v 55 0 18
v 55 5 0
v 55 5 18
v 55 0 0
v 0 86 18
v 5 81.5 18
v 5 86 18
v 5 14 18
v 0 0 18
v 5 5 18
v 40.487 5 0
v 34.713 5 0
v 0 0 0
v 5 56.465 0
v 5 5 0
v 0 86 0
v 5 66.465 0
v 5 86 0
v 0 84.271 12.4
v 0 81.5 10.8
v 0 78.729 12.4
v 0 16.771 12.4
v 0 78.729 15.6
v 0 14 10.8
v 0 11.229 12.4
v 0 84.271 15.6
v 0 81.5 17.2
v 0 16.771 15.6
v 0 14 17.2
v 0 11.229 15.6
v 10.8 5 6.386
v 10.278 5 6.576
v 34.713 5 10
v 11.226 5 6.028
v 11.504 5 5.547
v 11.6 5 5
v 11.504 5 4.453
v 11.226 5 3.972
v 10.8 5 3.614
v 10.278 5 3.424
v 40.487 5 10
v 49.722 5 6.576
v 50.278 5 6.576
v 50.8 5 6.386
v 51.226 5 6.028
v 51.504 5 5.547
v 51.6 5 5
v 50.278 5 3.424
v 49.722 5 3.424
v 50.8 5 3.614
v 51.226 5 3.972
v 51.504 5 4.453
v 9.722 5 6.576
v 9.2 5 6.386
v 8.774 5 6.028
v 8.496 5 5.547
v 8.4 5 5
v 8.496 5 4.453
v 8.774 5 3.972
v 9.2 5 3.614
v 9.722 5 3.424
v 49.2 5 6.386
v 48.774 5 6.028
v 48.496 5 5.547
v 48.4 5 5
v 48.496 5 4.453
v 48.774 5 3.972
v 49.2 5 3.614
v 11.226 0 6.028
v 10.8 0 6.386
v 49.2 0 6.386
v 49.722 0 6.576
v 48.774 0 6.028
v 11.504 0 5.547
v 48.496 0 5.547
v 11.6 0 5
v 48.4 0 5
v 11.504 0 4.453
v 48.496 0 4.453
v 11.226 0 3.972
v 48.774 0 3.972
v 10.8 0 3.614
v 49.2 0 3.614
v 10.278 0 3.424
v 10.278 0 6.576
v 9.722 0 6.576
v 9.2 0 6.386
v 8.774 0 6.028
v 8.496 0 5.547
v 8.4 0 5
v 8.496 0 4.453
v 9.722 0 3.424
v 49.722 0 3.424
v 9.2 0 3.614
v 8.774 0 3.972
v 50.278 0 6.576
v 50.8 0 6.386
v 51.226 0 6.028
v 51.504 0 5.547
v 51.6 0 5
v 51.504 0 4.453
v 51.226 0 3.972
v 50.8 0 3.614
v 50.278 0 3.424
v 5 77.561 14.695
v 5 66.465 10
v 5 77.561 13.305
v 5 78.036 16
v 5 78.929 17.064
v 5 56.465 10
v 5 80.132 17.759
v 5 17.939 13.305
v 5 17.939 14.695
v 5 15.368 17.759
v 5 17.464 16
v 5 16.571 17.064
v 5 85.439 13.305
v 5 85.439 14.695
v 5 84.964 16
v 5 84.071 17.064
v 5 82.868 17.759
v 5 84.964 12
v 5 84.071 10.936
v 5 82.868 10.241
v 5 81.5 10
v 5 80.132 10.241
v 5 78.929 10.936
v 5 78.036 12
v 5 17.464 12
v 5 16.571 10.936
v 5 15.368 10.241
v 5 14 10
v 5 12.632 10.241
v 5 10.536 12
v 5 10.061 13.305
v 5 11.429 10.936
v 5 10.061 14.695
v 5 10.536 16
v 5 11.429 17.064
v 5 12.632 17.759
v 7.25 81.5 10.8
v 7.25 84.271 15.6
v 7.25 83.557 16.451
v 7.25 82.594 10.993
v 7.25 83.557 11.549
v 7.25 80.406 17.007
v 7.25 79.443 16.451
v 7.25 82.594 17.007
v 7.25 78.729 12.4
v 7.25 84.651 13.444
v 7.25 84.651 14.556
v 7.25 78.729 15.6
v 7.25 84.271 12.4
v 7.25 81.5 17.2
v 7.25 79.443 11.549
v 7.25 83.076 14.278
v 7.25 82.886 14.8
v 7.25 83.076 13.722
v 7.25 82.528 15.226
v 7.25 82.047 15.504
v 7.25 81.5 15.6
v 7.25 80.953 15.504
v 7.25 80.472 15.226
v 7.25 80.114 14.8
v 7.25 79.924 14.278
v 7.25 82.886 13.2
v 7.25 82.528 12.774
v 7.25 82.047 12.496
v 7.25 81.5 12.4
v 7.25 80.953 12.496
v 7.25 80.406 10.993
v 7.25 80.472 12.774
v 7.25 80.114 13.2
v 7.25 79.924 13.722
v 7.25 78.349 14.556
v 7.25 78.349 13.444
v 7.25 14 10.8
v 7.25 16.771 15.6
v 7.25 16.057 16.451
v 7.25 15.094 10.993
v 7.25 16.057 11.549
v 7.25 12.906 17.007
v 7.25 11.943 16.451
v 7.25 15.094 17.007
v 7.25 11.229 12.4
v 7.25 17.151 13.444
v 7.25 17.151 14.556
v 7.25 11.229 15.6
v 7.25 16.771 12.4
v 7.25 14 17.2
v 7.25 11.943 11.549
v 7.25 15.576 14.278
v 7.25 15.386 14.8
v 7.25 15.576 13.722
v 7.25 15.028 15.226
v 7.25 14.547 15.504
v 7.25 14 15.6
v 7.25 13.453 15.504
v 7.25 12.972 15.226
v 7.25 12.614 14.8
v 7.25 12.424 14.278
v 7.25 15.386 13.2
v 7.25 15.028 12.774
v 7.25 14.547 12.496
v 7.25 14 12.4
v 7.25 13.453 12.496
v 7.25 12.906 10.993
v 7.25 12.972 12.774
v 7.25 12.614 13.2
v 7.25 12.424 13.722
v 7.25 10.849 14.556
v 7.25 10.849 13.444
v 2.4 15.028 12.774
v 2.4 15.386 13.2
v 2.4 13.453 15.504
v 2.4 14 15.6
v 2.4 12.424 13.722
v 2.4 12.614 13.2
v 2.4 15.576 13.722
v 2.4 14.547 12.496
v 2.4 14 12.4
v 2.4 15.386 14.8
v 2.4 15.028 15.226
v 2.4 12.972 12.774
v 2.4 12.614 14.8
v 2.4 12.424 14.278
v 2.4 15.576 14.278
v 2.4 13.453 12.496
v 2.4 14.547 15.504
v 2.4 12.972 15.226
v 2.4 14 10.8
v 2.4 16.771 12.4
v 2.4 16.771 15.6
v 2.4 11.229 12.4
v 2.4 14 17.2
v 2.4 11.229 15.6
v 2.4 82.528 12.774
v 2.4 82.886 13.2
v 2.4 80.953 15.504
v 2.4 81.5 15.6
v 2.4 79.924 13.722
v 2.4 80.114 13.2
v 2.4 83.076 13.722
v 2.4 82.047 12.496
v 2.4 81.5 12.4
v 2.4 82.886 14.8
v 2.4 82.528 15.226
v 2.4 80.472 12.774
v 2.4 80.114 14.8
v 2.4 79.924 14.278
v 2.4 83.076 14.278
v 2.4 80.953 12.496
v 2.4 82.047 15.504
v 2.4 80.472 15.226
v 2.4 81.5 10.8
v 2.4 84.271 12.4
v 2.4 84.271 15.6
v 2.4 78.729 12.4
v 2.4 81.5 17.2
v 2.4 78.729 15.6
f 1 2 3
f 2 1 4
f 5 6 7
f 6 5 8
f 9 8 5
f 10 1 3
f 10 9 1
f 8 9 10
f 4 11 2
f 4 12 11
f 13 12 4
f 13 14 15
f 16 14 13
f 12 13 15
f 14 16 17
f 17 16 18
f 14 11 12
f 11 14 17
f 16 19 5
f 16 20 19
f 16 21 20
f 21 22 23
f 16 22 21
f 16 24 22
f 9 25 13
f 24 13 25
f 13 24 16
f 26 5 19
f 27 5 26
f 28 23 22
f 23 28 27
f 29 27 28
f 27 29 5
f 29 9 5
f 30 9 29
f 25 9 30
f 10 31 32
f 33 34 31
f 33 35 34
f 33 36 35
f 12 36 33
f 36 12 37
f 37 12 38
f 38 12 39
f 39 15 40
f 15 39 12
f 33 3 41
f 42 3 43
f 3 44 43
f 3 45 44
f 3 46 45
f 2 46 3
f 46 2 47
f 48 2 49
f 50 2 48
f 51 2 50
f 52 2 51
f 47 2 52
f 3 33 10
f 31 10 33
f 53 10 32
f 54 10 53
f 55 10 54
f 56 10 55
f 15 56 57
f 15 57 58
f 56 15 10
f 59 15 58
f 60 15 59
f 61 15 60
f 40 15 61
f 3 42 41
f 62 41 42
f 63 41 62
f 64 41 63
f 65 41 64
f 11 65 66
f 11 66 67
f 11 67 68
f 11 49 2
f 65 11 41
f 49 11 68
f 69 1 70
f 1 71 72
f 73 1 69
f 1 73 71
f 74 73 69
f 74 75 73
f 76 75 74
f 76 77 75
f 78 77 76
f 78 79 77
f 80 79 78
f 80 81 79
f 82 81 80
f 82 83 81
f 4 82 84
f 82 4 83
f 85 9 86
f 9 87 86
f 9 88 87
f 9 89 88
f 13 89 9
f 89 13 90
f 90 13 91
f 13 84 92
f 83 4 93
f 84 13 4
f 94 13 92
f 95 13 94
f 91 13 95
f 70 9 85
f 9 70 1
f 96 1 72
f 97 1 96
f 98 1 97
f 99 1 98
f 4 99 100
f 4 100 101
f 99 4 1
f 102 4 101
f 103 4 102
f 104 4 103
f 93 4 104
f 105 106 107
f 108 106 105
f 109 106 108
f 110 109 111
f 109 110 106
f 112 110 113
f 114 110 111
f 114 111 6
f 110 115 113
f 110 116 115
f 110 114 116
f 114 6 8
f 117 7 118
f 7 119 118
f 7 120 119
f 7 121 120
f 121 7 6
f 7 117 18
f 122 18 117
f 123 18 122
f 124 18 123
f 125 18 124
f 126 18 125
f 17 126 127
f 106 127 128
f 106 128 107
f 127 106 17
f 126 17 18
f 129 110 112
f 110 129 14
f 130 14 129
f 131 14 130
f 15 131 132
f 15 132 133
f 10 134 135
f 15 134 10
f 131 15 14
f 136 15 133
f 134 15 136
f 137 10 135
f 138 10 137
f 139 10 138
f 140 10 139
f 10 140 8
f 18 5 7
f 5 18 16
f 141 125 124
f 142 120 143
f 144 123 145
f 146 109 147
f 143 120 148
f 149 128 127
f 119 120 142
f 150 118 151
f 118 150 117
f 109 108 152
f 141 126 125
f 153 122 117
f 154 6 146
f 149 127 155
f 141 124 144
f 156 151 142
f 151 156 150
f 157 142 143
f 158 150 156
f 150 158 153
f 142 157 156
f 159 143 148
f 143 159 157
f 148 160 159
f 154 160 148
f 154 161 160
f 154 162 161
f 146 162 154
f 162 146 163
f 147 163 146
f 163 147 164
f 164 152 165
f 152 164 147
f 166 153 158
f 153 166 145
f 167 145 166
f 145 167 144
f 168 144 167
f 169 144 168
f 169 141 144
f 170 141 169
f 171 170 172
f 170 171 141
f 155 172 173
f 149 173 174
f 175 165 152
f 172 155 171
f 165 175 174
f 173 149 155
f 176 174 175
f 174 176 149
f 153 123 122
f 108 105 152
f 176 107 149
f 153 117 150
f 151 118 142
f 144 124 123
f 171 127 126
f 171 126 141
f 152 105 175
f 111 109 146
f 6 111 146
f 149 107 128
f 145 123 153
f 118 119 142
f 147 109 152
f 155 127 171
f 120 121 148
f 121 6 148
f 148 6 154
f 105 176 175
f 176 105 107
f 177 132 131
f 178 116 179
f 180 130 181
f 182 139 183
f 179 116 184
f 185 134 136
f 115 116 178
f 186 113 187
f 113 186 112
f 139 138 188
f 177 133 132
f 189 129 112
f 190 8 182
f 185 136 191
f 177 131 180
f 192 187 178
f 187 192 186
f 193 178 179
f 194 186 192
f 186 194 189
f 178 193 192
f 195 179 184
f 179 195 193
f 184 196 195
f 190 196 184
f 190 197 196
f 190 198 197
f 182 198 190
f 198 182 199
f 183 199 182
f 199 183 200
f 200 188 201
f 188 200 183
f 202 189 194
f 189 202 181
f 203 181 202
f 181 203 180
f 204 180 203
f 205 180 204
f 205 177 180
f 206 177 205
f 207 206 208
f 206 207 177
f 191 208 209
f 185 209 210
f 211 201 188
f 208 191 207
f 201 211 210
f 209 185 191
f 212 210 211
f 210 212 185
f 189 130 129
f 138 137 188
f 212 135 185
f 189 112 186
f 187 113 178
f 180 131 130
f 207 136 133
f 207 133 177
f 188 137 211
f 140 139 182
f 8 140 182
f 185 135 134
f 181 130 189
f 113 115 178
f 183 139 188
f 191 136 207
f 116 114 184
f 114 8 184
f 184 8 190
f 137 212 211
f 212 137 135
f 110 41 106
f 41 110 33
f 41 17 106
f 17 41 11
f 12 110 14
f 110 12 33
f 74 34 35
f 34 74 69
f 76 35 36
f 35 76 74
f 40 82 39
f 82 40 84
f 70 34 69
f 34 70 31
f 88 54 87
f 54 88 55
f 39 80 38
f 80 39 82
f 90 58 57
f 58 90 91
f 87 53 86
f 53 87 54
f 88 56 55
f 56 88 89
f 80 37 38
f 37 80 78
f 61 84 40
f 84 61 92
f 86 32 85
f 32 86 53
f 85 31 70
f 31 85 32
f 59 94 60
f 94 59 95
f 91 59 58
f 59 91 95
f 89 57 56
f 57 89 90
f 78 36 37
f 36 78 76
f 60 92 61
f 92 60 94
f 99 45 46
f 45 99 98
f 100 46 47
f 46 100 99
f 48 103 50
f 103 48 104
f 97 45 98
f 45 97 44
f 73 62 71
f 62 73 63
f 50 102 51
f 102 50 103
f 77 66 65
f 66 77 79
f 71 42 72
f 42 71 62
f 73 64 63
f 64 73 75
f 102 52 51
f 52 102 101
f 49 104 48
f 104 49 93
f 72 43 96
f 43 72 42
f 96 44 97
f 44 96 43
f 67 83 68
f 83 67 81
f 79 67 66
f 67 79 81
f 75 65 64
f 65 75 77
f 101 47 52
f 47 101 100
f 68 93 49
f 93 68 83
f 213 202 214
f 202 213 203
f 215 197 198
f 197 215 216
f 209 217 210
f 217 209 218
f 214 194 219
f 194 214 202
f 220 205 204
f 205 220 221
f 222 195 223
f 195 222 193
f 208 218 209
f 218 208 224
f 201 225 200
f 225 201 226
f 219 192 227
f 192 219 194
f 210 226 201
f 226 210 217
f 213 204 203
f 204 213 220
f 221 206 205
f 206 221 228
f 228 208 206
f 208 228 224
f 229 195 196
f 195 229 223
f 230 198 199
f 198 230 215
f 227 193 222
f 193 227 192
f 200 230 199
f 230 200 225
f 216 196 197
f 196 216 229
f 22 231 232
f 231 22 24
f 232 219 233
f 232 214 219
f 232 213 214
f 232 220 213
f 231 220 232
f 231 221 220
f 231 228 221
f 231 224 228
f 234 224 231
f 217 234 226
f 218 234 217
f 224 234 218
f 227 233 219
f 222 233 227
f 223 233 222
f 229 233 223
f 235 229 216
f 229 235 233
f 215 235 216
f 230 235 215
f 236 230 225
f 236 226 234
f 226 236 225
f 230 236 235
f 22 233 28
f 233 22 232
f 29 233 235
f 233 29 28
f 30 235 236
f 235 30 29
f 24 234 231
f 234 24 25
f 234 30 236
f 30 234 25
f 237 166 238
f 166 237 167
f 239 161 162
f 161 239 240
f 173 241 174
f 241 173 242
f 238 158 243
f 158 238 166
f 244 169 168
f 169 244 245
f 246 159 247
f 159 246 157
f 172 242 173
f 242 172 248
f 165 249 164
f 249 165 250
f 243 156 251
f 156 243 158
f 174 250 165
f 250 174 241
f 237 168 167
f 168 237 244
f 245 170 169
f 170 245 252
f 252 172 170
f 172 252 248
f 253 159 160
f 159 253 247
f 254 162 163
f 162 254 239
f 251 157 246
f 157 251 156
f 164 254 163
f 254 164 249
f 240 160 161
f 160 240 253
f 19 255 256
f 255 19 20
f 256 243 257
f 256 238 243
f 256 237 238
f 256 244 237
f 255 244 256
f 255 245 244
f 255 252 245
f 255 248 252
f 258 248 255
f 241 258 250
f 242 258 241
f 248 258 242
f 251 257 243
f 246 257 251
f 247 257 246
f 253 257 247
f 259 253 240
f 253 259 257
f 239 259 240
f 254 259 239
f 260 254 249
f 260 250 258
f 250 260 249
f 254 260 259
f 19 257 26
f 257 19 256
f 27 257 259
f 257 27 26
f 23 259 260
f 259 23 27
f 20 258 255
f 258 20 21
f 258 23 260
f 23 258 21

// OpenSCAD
// file: configuration.scad
$fn = 18;

wall = 5;

bolt_slop = .5;
nut_slop = .85;
bolt_dia = 5+bolt_slop;
bolt_rad = bolt_dia/2;
bolt_cap_dia = 9.5+bolt_slop;
bolt_cap_rad = bolt_cap_dia/2;
nut_dia = 9+nut_slop;
nut_rad = nut_dia/2;
nut_height = 3;

ext_x = 20;
ext_y = 60;
// main file
include <configuration.scad>;

rumba_mount(left = true);
//rumba_mount(left = false);
//fan_mount();

rumba_x = 76;
rumba_y = 135;
mount_w = 8;


module rumba_mount(left = true){
	screwhole = 3.2;
	nuthole = 6.4;
	rad = screwhole/2;
	bump_h = 2.25;
	nutrad = nuthole/2;
	far_bolt = 71.5;
	close_bolt = 4;
	mid_bolt = 36;

	//set this to the mounting screw size
	mount_screw = 3.2/2;

	mirror([(left)?0:1,0,0])
	difference(){
		union(){
			//extrusion mount
			cube([ext_y-5, wall, wall*2+mount_w]);

			//rumba mount
			rotate([0,0,90]) translate([0,-wall,0]) cube([rumba_x+wall+wall, wall, wall*2+mount_w]);
			//rumba screw bumps
			translate([wall, wall+wall+far_bolt, wall*2+mount_w/2]) rotate([0,90,0]) cylinder(r2=rad*2, r1=rad*2.5, h=bump_h);
			if(left){
				translate([wall, wall+wall+close_bolt, wall*2+mount_w/2]) rotate([0,90,0]) cylinder(r2=rad*2, r1=rad*2.5, h=bump_h);
			}else{
				translate([wall, wall+wall+mid_bolt, wall*2+mount_w/2]) rotate([0,90,0]) cylinder(r2=rad*2, r1=rad*2.5, h=bump_h);
			}
			

			//brace
			translate([.1,(ext_y-22.5)*sqrt(3),0]) rotate([0,0,-60]) cube([(ext_y-22.5)*2, wall, wall*2]);
		}

		//extrusion screw holes
		for(i=[ext_x*.5,ext_x*2.5]) translate([i,0,wall]) rotate([90,0,0]) cylinder(r=mount_screw, h=wall*3, center=true);
		
		//rumba screw holes
		translate([wall, wall+wall+far_bolt, wall*2+mount_w/2]) rotate([0,90,0]) cylinder(r=rad, h=rad*10, center=true);
		translate([-.1, wall+wall+far_bolt, wall*2+mount_w/2]) rotate([0,90,0]) cylinder(r=nutrad, h=wall/2, $fn=6);
		
			if(left){
				translate([wall, wall+wall+close_bolt, wall*2+mount_w/2]) rotate([0,90,0]) cylinder(r=rad, h=rad*10, center=true);
				translate([-.1, wall+wall+close_bolt, wall*2+mount_w/2]) rotate([0,90,0]) cylinder(r=nutrad, h=wall/2, $fn=6);
			}else{
				translate([wall, wall+wall+mid_bolt, wall*2+mount_w/2]) rotate([0,90,0]) cylinder(r=rad, h=rad*10, center=true);
				translate([-.1, wall+wall+mid_bolt, wall*2+mount_w/2]) rotate([0,90,0]) cylinder(r=nutrad, h=wall/2, $fn=6);
			}
	}
}

//%cube([40,40,40], center=true);
module fan_mount(){
	//these settings are for 40mm fan
	hole = 38/2;
	screws = 45/2;
	bracket = 50;
	screw_rad = 3/2;

	//this'll do a 60mm fan
	//hole = 58/2;
	//screws = 70/2;
	//bracket = 70;
	//screw_rad = 3.2/2;
	

	difference(){
		union(){
			//extrusion mount
			translate([0,bracket/2+wall/2,wall/4+wall]) cube([bracket, wall, wall*2], center=true);
			
			//fan mount
			translate([-wall/2,-wall/4,wall/4]) minkowski(){
				cube([bracket-wall, bracket+wall-wall/2, wall/2], center=true);
				intersection(){
					cube([wall,wall,wall]);
					translate([wall/2,wall,0]) cylinder(r=wall/2, h=.01);
				}
			}

			//fillet
			translate([0,bracket/2-wall/2+.1,wall-.1]) difference(){
				cube([bracket,wall,wall], center=true);
				translate([0,-wall/2,wall/2]) rotate([0,90,0]) cylinder(r=wall, h=bracket+1, center=true);
			}

			//side rails
			for(i=[1,-1]) translate([i*(-bracket/2+wall/4), +wall/2, wall*3/4]) cube([wall/2, bracket, wall/2], center=true);
		}

		//fan hole
		cylinder(r=hole, h=wall*2, center=true);

		//fan screw holes
		for(i=[0:90:359]) rotate([0,0,i]) translate([screws/sqrt(2),screws/sqrt(2),0]) cylinder(r=screw_rad, h=wall*2, center=true);

		//translate([0,bracket/2+wall/2,wall/4+wall])
		//extrusion screw holes
		for(i=[wall*1.5-bracket/2,bracket/2-wall*1.5]) {
			translate([i,bracket/2+wall/2,wall*1.4]) rotate([90,0,0]) cylinder(r=bolt_rad, h=wall*3, center=true);
			translate([i,bracket/2-wall/2,wall*1.4]) rotate([90,0,0]) cylinder(r=bolt_cap_rad, h=wall, center=true);
		}
	}
}
